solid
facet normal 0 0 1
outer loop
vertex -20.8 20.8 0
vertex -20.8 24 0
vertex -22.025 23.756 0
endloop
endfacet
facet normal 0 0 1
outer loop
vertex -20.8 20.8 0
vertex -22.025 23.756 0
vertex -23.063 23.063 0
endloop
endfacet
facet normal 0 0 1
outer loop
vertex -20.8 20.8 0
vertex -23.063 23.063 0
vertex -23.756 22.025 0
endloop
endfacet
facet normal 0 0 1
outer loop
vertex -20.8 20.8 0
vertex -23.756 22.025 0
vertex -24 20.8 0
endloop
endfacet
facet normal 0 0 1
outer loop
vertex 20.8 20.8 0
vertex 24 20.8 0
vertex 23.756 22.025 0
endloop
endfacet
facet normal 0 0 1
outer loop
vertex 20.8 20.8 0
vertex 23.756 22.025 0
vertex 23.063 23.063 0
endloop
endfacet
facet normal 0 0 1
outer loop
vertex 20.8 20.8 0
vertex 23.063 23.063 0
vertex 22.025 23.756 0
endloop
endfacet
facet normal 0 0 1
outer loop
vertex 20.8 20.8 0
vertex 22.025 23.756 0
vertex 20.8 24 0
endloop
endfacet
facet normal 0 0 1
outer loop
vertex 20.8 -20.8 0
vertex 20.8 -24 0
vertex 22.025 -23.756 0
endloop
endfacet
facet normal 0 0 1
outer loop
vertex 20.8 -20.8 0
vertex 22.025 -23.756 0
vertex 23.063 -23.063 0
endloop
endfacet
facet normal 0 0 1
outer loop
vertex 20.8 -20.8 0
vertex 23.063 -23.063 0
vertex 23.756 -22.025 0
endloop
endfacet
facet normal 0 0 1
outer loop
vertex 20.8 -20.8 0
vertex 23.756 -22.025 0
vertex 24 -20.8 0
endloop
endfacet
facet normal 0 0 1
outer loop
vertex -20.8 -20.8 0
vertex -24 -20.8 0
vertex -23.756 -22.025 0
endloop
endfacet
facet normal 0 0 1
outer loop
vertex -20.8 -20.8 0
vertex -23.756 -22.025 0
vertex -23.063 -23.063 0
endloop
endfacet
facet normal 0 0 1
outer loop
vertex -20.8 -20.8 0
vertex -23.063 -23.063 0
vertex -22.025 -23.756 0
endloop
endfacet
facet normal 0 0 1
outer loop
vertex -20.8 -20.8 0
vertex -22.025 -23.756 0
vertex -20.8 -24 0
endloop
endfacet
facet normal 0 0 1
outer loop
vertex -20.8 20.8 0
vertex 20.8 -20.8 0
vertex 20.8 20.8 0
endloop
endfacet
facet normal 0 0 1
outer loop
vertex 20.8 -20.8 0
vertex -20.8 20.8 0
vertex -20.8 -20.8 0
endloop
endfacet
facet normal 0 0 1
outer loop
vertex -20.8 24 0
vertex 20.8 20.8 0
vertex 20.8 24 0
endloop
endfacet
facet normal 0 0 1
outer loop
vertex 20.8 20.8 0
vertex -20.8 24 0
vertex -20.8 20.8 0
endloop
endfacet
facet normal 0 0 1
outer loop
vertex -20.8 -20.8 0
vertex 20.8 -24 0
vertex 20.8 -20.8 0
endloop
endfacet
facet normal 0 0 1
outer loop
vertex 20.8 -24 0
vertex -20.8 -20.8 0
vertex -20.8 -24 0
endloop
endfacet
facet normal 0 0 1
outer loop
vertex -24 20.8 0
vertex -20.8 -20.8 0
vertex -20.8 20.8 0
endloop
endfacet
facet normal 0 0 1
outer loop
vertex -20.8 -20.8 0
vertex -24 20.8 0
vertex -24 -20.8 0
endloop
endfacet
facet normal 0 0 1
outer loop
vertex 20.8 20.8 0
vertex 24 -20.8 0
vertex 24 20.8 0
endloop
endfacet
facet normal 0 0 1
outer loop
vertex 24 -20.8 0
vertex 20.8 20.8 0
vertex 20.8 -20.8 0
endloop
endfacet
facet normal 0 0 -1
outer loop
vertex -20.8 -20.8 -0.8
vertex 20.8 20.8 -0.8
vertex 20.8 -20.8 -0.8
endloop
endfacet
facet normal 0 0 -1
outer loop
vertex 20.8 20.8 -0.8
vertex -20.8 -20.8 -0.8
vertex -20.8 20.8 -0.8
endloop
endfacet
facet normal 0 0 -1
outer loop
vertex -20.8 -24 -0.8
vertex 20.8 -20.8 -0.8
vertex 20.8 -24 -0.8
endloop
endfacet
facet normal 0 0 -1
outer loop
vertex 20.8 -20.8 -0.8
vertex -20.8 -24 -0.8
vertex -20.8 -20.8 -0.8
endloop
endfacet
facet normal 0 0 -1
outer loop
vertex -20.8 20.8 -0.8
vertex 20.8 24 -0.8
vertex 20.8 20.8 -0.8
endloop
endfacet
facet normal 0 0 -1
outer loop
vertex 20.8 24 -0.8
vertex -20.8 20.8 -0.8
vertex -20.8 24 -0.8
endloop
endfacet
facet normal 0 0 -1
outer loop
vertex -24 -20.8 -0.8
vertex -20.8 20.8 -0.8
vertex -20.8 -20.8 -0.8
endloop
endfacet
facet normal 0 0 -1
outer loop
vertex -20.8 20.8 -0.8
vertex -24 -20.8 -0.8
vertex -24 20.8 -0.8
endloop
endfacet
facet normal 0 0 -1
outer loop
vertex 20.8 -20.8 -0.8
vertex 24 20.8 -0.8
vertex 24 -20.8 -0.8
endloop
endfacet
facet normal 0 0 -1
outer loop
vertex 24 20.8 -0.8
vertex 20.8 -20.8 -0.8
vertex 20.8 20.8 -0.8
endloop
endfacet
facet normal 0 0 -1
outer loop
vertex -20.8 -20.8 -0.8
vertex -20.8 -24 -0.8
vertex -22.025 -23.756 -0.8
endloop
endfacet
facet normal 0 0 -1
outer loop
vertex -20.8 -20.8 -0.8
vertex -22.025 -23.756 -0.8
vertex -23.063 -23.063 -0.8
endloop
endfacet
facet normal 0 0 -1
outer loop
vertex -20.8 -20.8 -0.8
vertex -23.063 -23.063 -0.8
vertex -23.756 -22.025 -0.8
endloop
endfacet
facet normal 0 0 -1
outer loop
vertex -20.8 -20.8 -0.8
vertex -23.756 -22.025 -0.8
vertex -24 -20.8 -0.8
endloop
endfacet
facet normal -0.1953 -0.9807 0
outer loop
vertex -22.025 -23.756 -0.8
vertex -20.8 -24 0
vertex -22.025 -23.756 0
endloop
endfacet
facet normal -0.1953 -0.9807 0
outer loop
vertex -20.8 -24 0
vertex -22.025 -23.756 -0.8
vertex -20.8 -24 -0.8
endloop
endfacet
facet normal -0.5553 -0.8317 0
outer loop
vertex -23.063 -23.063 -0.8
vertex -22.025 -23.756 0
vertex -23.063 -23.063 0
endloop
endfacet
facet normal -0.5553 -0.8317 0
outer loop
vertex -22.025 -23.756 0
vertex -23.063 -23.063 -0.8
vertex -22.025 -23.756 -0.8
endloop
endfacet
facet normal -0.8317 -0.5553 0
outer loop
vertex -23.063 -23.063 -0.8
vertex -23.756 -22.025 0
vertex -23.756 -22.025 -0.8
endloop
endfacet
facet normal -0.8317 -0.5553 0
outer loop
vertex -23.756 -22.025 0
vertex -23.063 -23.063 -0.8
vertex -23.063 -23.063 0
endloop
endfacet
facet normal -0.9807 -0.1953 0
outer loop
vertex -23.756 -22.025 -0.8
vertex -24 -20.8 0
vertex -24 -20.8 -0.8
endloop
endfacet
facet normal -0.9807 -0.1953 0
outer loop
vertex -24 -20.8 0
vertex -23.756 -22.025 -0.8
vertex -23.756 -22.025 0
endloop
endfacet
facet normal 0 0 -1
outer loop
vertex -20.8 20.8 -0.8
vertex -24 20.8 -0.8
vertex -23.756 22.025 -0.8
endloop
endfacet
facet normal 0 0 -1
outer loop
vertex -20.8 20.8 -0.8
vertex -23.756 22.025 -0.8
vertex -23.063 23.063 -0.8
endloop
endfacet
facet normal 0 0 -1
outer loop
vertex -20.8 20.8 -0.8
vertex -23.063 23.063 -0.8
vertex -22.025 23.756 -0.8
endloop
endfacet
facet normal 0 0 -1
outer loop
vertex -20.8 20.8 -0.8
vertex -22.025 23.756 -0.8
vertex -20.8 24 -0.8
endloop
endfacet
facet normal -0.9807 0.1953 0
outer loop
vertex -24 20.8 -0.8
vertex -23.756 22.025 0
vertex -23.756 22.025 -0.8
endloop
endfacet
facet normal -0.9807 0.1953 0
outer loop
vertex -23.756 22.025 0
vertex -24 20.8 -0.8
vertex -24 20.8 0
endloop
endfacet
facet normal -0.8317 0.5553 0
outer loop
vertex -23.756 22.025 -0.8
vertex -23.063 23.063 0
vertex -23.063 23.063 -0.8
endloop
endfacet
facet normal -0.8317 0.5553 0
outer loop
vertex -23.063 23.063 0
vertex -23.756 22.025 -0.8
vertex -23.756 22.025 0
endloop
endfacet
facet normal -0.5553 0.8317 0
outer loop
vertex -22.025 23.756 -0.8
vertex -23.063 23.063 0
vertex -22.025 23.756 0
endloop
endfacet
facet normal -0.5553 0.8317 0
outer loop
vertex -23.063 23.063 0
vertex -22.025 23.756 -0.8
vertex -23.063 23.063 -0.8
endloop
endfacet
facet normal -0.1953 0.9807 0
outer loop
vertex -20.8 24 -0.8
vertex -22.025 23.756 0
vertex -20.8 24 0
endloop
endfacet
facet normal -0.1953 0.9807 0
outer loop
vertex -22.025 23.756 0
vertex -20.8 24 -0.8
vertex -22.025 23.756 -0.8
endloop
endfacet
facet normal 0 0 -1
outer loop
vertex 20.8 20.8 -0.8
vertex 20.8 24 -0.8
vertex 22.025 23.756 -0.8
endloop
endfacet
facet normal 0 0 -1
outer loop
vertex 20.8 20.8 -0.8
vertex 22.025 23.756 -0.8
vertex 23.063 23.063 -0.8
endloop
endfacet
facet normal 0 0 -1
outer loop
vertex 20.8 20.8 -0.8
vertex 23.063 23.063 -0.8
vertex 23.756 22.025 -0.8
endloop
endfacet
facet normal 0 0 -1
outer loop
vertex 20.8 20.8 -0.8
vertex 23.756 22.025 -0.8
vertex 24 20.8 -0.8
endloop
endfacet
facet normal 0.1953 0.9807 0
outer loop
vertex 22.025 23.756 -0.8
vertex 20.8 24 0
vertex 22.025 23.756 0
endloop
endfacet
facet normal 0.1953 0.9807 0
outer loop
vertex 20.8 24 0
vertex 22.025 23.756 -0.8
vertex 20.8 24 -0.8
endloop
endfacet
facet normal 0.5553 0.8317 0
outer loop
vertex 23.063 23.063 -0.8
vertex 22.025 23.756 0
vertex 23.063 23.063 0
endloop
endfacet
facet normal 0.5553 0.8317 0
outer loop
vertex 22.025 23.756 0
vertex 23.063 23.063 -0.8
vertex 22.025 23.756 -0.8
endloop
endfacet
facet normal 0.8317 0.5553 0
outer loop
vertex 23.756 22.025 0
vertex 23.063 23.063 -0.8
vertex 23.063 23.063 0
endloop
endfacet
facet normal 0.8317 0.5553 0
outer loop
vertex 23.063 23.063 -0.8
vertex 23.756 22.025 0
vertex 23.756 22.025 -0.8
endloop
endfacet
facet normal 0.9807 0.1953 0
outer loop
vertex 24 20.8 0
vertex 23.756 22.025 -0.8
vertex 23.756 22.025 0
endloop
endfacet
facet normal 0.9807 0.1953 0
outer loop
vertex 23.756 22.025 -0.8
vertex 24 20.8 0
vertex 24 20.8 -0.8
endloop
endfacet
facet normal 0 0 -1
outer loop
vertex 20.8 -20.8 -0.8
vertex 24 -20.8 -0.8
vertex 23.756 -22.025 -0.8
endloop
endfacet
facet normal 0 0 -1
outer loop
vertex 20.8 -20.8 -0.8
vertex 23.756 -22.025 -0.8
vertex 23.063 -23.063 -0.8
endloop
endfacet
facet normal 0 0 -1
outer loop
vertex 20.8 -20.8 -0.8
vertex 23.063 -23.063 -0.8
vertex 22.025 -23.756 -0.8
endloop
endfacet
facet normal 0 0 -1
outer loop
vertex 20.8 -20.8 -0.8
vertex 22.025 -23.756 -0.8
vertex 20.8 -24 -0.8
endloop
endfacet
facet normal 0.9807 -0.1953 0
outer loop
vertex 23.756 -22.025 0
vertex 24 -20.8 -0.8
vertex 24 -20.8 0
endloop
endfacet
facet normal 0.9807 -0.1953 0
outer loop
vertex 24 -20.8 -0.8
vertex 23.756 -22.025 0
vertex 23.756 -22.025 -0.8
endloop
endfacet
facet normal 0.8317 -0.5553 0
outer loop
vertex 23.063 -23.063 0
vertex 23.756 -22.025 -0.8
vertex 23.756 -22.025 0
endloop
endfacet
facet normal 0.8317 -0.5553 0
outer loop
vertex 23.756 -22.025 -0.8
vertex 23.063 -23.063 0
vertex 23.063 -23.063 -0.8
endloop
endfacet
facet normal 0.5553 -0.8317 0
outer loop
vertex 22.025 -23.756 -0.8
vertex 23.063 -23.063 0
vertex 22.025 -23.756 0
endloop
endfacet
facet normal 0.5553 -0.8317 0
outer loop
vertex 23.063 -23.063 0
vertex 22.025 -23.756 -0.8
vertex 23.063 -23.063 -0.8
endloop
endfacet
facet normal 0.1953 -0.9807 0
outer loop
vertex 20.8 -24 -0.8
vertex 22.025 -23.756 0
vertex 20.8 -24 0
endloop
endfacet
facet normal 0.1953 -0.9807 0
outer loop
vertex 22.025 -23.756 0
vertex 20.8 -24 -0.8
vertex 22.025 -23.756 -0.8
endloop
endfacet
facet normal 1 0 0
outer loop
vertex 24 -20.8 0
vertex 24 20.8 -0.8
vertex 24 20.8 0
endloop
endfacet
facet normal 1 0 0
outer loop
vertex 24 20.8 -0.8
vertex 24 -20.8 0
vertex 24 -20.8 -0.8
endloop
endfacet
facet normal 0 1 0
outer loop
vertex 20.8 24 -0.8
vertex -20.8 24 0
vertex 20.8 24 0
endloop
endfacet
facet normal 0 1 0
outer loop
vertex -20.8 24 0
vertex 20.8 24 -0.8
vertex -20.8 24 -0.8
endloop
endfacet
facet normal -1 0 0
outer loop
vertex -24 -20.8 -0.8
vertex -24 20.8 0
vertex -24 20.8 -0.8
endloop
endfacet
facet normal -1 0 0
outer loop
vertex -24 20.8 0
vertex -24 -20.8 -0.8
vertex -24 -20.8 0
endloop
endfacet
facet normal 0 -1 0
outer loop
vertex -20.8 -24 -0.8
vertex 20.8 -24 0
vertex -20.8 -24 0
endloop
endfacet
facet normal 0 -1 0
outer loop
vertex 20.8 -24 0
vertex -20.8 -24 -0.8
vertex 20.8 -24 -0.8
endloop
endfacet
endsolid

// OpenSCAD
// file: ../p/4-4edge.scad
use <../lib.scad>
$fa=1; $fs=0.2;
function ldraw_lib__4_4edge(realsolid=false) = [
// 0 Circle 1.0
// 0 Name: 4-4edge.dat
// 0 Author: James Jessiman
// 0 !LDRAW_ORG Primitive UPDATE 2017-01
// 0 !LICENSE Licensed under CC BY 2.0 and CC BY 4.0 : see CAreadme.txt
// 
// 0 BFC CERTIFY CCW
  [0,"BFC","CERTIFY"],
  [0,"BFC","CCW"],
// 
// 0 !HISTORY 1998-12-15 [PTadmin] Official Update 1998-10
// 0 !HISTORY 2005-12-28 [PTadmin] Official Update 2005-01
// 0 !HISTORY 2007-06-24 [PTadmin] Header formatted for Contributor Agreement
// 0 !HISTORY 2008-07-01 [PTadmin] Official Update 2008-01
// 0 !HISTORY 2017-01-15 [Steffen] BFCed
// 0 !HISTORY 2017-12-30 [PTadmin] Official Update 2017-01
// 
// 
// 2 24 1 0 0 0.9239 0 0.3827
  [2,24,1,0,0,0.9239,0,0.3827],
// 2 24 0.9239 0 0.3827 0.7071 0 0.7071
  [2,24,0.9239,0,0.3827,0.7071,0,0.7071],
// 2 24 0.7071 0 0.7071 0.3827 0 0.9239
  [2,24,0.7071,0,0.7071,0.3827,0,0.9239],
// 2 24 0.3827 0 0.9239 0 0 1
  [2,24,0.3827,0,0.9239,0,0,1],
// 2 24 0 0 1 -0.3827 0 0.9239
  [2,24,0,0,1,-0.3827,0,0.9239],
// 2 24 -0.3827 0 0.9239 -0.7071 0 0.7071
  [2,24,-0.3827,0,0.9239,-0.7071,0,0.7071],
// 2 24 -0.7071 0 0.7071 -0.9239 0 0.3827
  [2,24,-0.7071,0,0.7071,-0.9239,0,0.3827],
// 2 24 -0.9239 0 0.3827 -1 0 -0
  [2,24,-0.9239,0,0.3827,-1,0,-0],
// 2 24 -1 0 -0 -0.9239 0 -0.3827
  [2,24,-1,0,-0,-0.9239,0,-0.3827],
// 2 24 -0.9239 0 -0.3827 -0.7071 0 -0.7071
  [2,24,-0.9239,0,-0.3827,-0.7071,0,-0.7071],
// 2 24 -0.7071 0 -0.7071 -0.3827 0 -0.9239
  [2,24,-0.7071,0,-0.7071,-0.3827,0,-0.9239],
// 2 24 -0.3827 0 -0.9239 0 0 -1
  [2,24,-0.3827,0,-0.9239,0,0,-1],
// 2 24 0 0 -1 0.3827 0 -0.9239
  [2,24,0,0,-1,0.3827,0,-0.9239],
// 2 24 0.3827 0 -0.9239 0.7071 0 -0.7071
  [2,24,0.3827,0,-0.9239,0.7071,0,-0.7071],
// 2 24 0.7071 0 -0.7071 0.9239 0 -0.3827
  [2,24,0.7071,0,-0.7071,0.9239,0,-0.3827],
// 2 24 0.9239 0 -0.3827 1 0 0
  [2,24,0.9239,0,-0.3827,1,0,0],
];
module ldraw_lib__4_4edge(step=0, col=false, unit=2/5, alt=false, line=0.2, solid=!$preview)
    makepoly(ldraw_lib__4_4edge(solid), step=step, col=col, unit=unit, alt=alt, line=line, solid=solid);
ldraw_lib__4_4edge(line=0.2);
// file: ../p/4-4disc.scad
use <../lib.scad>
$fa=1; $fs=0.2;
function ldraw_lib__4_4disc(realsolid=false) = [
// 0 Disc 1.0
// 0 Name: 4-4disc.dat
// 0 Author: James Jessiman
// 0 !LDRAW_ORG Primitive UPDATE 2002-02
// 0 !LICENSE Licensed under CC BY 2.0 and CC BY 4.0 : see CAreadme.txt
// 
// 0 BFC CERTIFY CCW
  [0,"BFC","CERTIFY"],
  [0,"BFC","CCW"],
// 
// 0 !HISTORY 1998-12-15 [PTadmin] Official Update 1998-10
// 0 !HISTORY 2002-03-23 [sbliss] Added BFC statement
// 0 !HISTORY 2002-04-25 [PTadmin] Official Update 2002-02
// 0 !HISTORY 2007-06-24 [PTadmin] Header formatted for Contributor Agreement
// 0 !HISTORY 2008-07-01 [PTadmin] Official Update 2008-01
// 
// 
// 3 16 0 0 0 1 0 0 0.9239 0 0.3827
  [3,16,0,0,0,1,0,0,0.9239,0,0.3827],
// 3 16 0 0 0 0.9239 0 0.3827 0.7071 0 0.7071
  [3,16,0,0,0,0.9239,0,0.3827,0.7071,0,0.7071],
// 3 16 0 0 0 0.7071 0 0.7071 0.3827 0 0.9239
  [3,16,0,0,0,0.7071,0,0.7071,0.3827,0,0.9239],
// 3 16 0 0 0 0.3827 0 0.9239 0 0 1
  [3,16,0,0,0,0.3827,0,0.9239,0,0,1],
// 3 16 0 0 0 0 0 1 -0.3827 0 0.9239
  [3,16,0,0,0,0,0,1,-0.3827,0,0.9239],
// 3 16 0 0 0 -0.3827 0 0.9239 -0.7071 0 0.7071
  [3,16,0,0,0,-0.3827,0,0.9239,-0.7071,0,0.7071],
// 3 16 0 0 0 -0.7071 0 0.7071 -0.9239 0 0.3827
  [3,16,0,0,0,-0.7071,0,0.7071,-0.9239,0,0.3827],
// 3 16 0 0 0 -0.9239 0 0.3827 -1 0 -0
  [3,16,0,0,0,-0.9239,0,0.3827,-1,0,-0],
// 3 16 0 0 0 -1 0 -0 -0.9239 0 -0.3827
  [3,16,0,0,0,-1,0,-0,-0.9239,0,-0.3827],
// 3 16 0 0 0 -0.9239 0 -0.3827 -0.7071 0 -0.7071
  [3,16,0,0,0,-0.9239,0,-0.3827,-0.7071,0,-0.7071],
// 3 16 0 0 0 -0.7071 0 -0.7071 -0.3827 0 -0.9239
  [3,16,0,0,0,-0.7071,0,-0.7071,-0.3827,0,-0.9239],
// 3 16 0 0 0 -0.3827 0 -0.9239 0 0 -1
  [3,16,0,0,0,-0.3827,0,-0.9239,0,0,-1],
// 3 16 0 0 0 0 0 -1 0.3827 0 -0.9239
  [3,16,0,0,0,0,0,-1,0.3827,0,-0.9239],
// 3 16 0 0 0 0.3827 0 -0.9239 0.7071 0 -0.7071
  [3,16,0,0,0,0.3827,0,-0.9239,0.7071,0,-0.7071],
// 3 16 0 0 0 0.7071 0 -0.7071 0.9239 0 -0.3827
  [3,16,0,0,0,0.7071,0,-0.7071,0.9239,0,-0.3827],
// 3 16 0 0 0 0.9239 0 -0.3827 1 0 0
  [3,16,0,0,0,0.9239,0,-0.3827,1,0,0],
// 0
];
module ldraw_lib__4_4disc(step=0, col=false, unit=2/5, alt=false, line=0.2, solid=!$preview)
    makepoly(ldraw_lib__4_4disc(solid), step=step, col=col, unit=unit, alt=alt, line=line, solid=solid);
ldraw_lib__4_4disc(line=0.2);
// file: ../p/4-4cyli.scad
use <../lib.scad>
$fa=1; $fs=0.2;
function ldraw_lib__4_4cyli(realsolid=false) = [
// 0 Cylinder 1.0
// 0 Name: 4-4cyli.dat
// 0 Author: James Jessiman
// 0 !LDRAW_ORG Primitive UPDATE 2005-01
// 0 !LICENSE Licensed under CC BY 2.0 and CC BY 4.0 : see CAreadme.txt
// 
// 0 BFC CERTIFY CCW
  [0,"BFC","CERTIFY"],
  [0,"BFC","CCW"],
// 
// 0 !HISTORY 1998-12-15 [PTadmin] Official Update 1998-10
// 0 !HISTORY 2002-03-23 [sbliss] Added BFC statement; merged headers from files in distributions LDraw 0.27 and Complete.
// 0 !HISTORY 2002-04-25 [PTadmin] Official Update 2002-02
// 0 !HISTORY 2004-12-14 [guyvivan] BFC CCW
// 0 !HISTORY 2005-12-28 [PTadmin] Official Update 2005-01
// 0 !HISTORY 2007-06-24 [PTadmin] Header formatted for Contributor Agreement
// 0 !HISTORY 2008-07-01 [PTadmin] Official Update 2008-01
// 
// 
// 4 16 1 1 0 0.9239 1 0.3827 0.9239 0 0.3827 1 0 0
  [4,16,1,1,0,0.9239,1,0.3827,0.9239,0,0.3827,1,0,0],
// 5 24 1 0 0 1 1 0 0.9239 0 0.3827 0.9239 0 -0.3827
  [5,24,1,0,0,1,1,0,0.9239,0,0.3827,0.9239,0,-0.3827],
// 4 16 0.9239 1 0.3827 0.7071 1 0.7071 0.7071 0 0.7071 0.9239 0 0.3827
  [4,16,0.9239,1,0.3827,0.7071,1,0.7071,0.7071,0,0.7071,0.9239,0,0.3827],
// 5 24 0.9239 0 0.3827 0.9239 1 0.3827 0.7071 0 0.7071 1 0 0
  [5,24,0.9239,0,0.3827,0.9239,1,0.3827,0.7071,0,0.7071,1,0,0],
// 4 16 0.7071 1 0.7071 0.3827 1 0.9239 0.3827 0 0.9239 0.7071 0 0.7071
  [4,16,0.7071,1,0.7071,0.3827,1,0.9239,0.3827,0,0.9239,0.7071,0,0.7071],
// 5 24 0.7071 0 0.7071 0.7071 1 0.7071 0.3827 0 0.9239 0.9239 0 0.3827
  [5,24,0.7071,0,0.7071,0.7071,1,0.7071,0.3827,0,0.9239,0.9239,0,0.3827],
// 4 16 0.3827 1 0.9239 0 1 1 0 0 1 0.3827 0 0.9239
  [4,16,0.3827,1,0.9239,0,1,1,0,0,1,0.3827,0,0.9239],
// 5 24 0.3827 0 0.9239 0.3827 1 0.9239 0 0 1 0.7071 0 0.7071
  [5,24,0.3827,0,0.9239,0.3827,1,0.9239,0,0,1,0.7071,0,0.7071],
// 4 16 0 1 1 -0.3827 1 0.9239 -0.3827 0 0.9239 0 0 1
  [4,16,0,1,1,-0.3827,1,0.9239,-0.3827,0,0.9239,0,0,1],
// 5 24 0 0 1 0 1 1 -0.3827 0 0.9239 0.3827 0 0.9239
  [5,24,0,0,1,0,1,1,-0.3827,0,0.9239,0.3827,0,0.9239],
// 4 16 -0.3827 1 0.9239 -0.7071 1 0.7071 -0.7071 0 0.7071 -0.3827 0 0.9239
  [4,16,-0.3827,1,0.9239,-0.7071,1,0.7071,-0.7071,0,0.7071,-0.3827,0,0.9239],
// 5 24 -0.3827 0 0.9239 -0.3827 1 0.9239 -0.7071 0 0.7071 0 0 1
  [5,24,-0.3827,0,0.9239,-0.3827,1,0.9239,-0.7071,0,0.7071,0,0,1],
// 4 16 -0.7071 1 0.7071 -0.9239 1 0.3827 -0.9239 0 0.3827 -0.7071 0 0.7071
  [4,16,-0.7071,1,0.7071,-0.9239,1,0.3827,-0.9239,0,0.3827,-0.7071,0,0.7071],
// 5 24 -0.7071 0 0.7071 -0.7071 1 0.7071 -0.9239 0 0.3827 -0.3827 0 0.9239
  [5,24,-0.7071,0,0.7071,-0.7071,1,0.7071,-0.9239,0,0.3827,-0.3827,0,0.9239],
// 4 16 -0.9239 1 0.3827 -1 1 0 -1 0 0 -0.9239 0 0.3827
  [4,16,-0.9239,1,0.3827,-1,1,0,-1,0,0,-0.9239,0,0.3827],
// 5 24 -0.9239 0 0.3827 -0.9239 1 0.3827 -1 0 0 -0.7071 0 0.7071
  [5,24,-0.9239,0,0.3827,-0.9239,1,0.3827,-1,0,0,-0.7071,0,0.7071],
// 4 16 -1 1 0 -0.9239 1 -0.3827 -0.9239 0 -0.3827 -1 0 0
  [4,16,-1,1,0,-0.9239,1,-0.3827,-0.9239,0,-0.3827,-1,0,0],
// 5 24 -1 0 0 -1 1 0 -0.9239 0 -0.3827 -0.9239 0 0.3827
  [5,24,-1,0,0,-1,1,0,-0.9239,0,-0.3827,-0.9239,0,0.3827],
// 4 16 -0.9239 1 -0.3827 -0.7071 1 -0.7071 -0.7071 0 -0.7071 -0.9239 0 -0.3827
  [4,16,-0.9239,1,-0.3827,-0.7071,1,-0.7071,-0.7071,0,-0.7071,-0.9239,0,-0.3827],
// 5 24 -0.9239 0 -0.3827 -0.9239 1 -0.3827 -0.7071 0 -0.7071 -1 0 0
  [5,24,-0.9239,0,-0.3827,-0.9239,1,-0.3827,-0.7071,0,-0.7071,-1,0,0],
// 4 16 -0.7071 1 -0.7071 -0.3827 1 -0.9239 -0.3827 0 -0.9239 -0.7071 0 -0.7071
  [4,16,-0.7071,1,-0.7071,-0.3827,1,-0.9239,-0.3827,0,-0.9239,-0.7071,0,-0.7071],
// 5 24 -0.7071 0 -0.7071 -0.7071 1 -0.7071 -0.3827 0 -0.9239 -0.9239 0 -0.3827
  [5,24,-0.7071,0,-0.7071,-0.7071,1,-0.7071,-0.3827,0,-0.9239,-0.9239,0,-0.3827],
// 4 16 -0.3827 1 -0.9239 0 1 -1 0 0 -1 -0.3827 0 -0.9239
  [4,16,-0.3827,1,-0.9239,0,1,-1,0,0,-1,-0.3827,0,-0.9239],
// 5 24 -0.3827 0 -0.9239 -0.3827 1 -0.9239 0 0 -1 -0.7071 0 -0.7071
  [5,24,-0.3827,0,-0.9239,-0.3827,1,-0.9239,0,0,-1,-0.7071,0,-0.7071],
// 4 16 0 1 -1 0.3827 1 -0.9239 0.3827 0 -0.9239 0 0 -1
  [4,16,0,1,-1,0.3827,1,-0.9239,0.3827,0,-0.9239,0,0,-1],
// 5 24 0 0 -1 0 1 -1 0.3827 0 -0.9239 -0.3827 0 -0.9239
  [5,24,0,0,-1,0,1,-1,0.3827,0,-0.9239,-0.3827,0,-0.9239],
// 4 16 0.3827 1 -0.9239 0.7071 1 -0.7071 0.7071 0 -0.7071 0.3827 0 -0.9239
  [4,16,0.3827,1,-0.9239,0.7071,1,-0.7071,0.7071,0,-0.7071,0.3827,0,-0.9239],
// 5 24 0.3827 0 -0.9239 0.3827 1 -0.9239 0.7071 0 -0.7071 0 0 -1
  [5,24,0.3827,0,-0.9239,0.3827,1,-0.9239,0.7071,0,-0.7071,0,0,-1],
// 4 16 0.7071 1 -0.7071 0.9239 1 -0.3827 0.9239 0 -0.3827 0.7071 0 -0.7071
  [4,16,0.7071,1,-0.7071,0.9239,1,-0.3827,0.9239,0,-0.3827,0.7071,0,-0.7071],
// 5 24 0.7071 0 -0.7071 0.7071 1 -0.7071 0.9239 0 -0.3827 0.3827 0 -0.9239
  [5,24,0.7071,0,-0.7071,0.7071,1,-0.7071,0.9239,0,-0.3827,0.3827,0,-0.9239],
// 4 16 0.9239 1 -0.3827 1 1 0 1 0 0 0.9239 0 -0.3827
  [4,16,0.9239,1,-0.3827,1,1,0,1,0,0,0.9239,0,-0.3827],
// 5 24 0.9239 0 -0.3827 0.9239 1 -0.3827 1 0 0 0.7071 0 -0.7071
  [5,24,0.9239,0,-0.3827,0.9239,1,-0.3827,1,0,0,0.7071,0,-0.7071],
// 0
];
module ldraw_lib__4_4cyli(step=0, col=false, unit=2/5, alt=false, line=0.2, solid=!$preview)
    makepoly(ldraw_lib__4_4cyli(solid), step=step, col=col, unit=unit, alt=alt, line=line, solid=solid);
ldraw_lib__4_4cyli(line=0.2);
// file: ../p/stud3.scad
use <../lib.scad>
use <4-4cyli.scad>
use <4-4disc.scad>
use <4-4edge.scad>
$fa=1; $fs=0.2;
function ldraw_lib__stud3(realsolid=false) = realsolid ? 
    [openscad(translate([0,0,-eps()], o=cylinder(4+eps(), r=4)),2)] : [
// 0 Stud Tube Solid
// 0 Name: stud3.dat
// 0 Author: James Jessiman
// 0 !LDRAW_ORG Primitive UPDATE 2012-01
// 0 !LICENSE Licensed under CC BY 2.0 and CC BY 4.0 : see CAreadme.txt
// 
// 0 BFC CERTIFY CCW
  [0,"BFC","CERTIFY"],
  [0,"BFC","CCW"],
// 
// 0 !HISTORY 2002-04-04 [sbliss] Modified for BFC compliance
// 0 !HISTORY 2002-04-25 [PTadmin] Official Update 2002-02
// 0 !HISTORY 2007-06-24 [PTadmin] Header formatted for Contributor Agreement
// 0 !HISTORY 2008-07-01 [PTadmin] Official Update 2008-01
// 0 !HISTORY 2012-02-16 [Philo] Changed to CCW
// 0 !HISTORY 2012-03-30 [PTadmin] Official Update 2012-01
// 
// 
// 1 16 0 -4 0 4 0 0 0 1 0 0 0 4 4-4edge.dat
  [1,16,0,-4,0,4,0,0,0,1,0,0,0,4, ldraw_lib__4_4edge(realsolid)],
// 1 16 0 0 0 4 0 0 0 1 0 0 0 4 4-4edge.dat
  [1,16,0,0,0,4,0,0,0,1,0,0,0,4, ldraw_lib__4_4edge(realsolid)],
// 1 16 0 -4 0 4 0 0 0 1 0 0 0 4 4-4disc.dat
  [1,16,0,-4,0,4,0,0,0,1,0,0,0,4, ldraw_lib__4_4disc(realsolid)],
// 1 16 0 -4 0 4 0 0 0 4 0 0 0 4 4-4cyli.dat
  [1,16,0,-4,0,4,0,0,0,4,0,0,0,4, ldraw_lib__4_4cyli(realsolid)],
];
module ldraw_lib__stud3(step=0, col=false, unit=2/5, alt=false, line=0.2, solid=!$preview)
    makepoly(ldraw_lib__stud3(solid), step=step, col=col, unit=unit, alt=alt, line=line, solid=solid);
ldraw_lib__stud3(line=0.2);
// file: ../p/stud.scad
use <../lib.scad>
use <4-4cyli.scad>
use <4-4disc.scad>
use <4-4edge.scad>
$fa=1; $fs=0.2;
function ldraw_lib__stud(realsolid=false) = realsolid ? 
    [openscad(translate([0,0,-eps()], o=cylinder(4+eps(), r=6)),2)] : [
// 0 Stud
// 0 Name: stud.dat
// 0 Author: James Jessiman
// 0 !LDRAW_ORG Primitive UPDATE 2012-01
// 0 !LICENSE Licensed under CC BY 2.0 and CC BY 4.0 : see CAreadme.txt
// 
// 0 BFC CERTIFY CCW
  [0,"BFC","CERTIFY"],
  [0,"BFC","CCW"],
// 
// 0 !HISTORY 2002-04-04 [sbliss] Modified for BFC compliance
// 0 !HISTORY 2002-04-25 [PTadmin] Official Update 2002-02
// 0 !HISTORY 2007-06-24 [PTadmin] Header formatted for Contributor Agreement
// 0 !HISTORY 2008-07-01 [PTadmin] Official Update 2008-01
// 0 !HISTORY 2012-02-16 [Philo] Changed to CCW
// 0 !HISTORY 2012-03-30 [PTadmin] Official Update 2012-01
// 
// 
// 1 16 0 0 0 6 0 0 0 1 0 0 0 6 4-4edge.dat
  [1,16,0,0,0,6,0,0,0,1,0,0,0,6, ldraw_lib__4_4edge(realsolid)],
// 1 16 0 -4 0 6 0 0 0 1 0 0 0 6 4-4edge.dat
  [1,16,0,-4,0,6,0,0,0,1,0,0,0,6, ldraw_lib__4_4edge(realsolid)],
// 1 16 0 0 0 6 0 0 0 -4 0 0 0 6 4-4cyli.dat
  [1,16,0,0,0,6,0,0,0,-4,0,0,0,6, ldraw_lib__4_4cyli(realsolid)],
// 1 16 0 -4 0 6 0 0 0 1 0 0 0 6 4-4disc.dat
  [1,16,0,-4,0,6,0,0,0,1,0,0,0,6, ldraw_lib__4_4disc(realsolid)],
];
module ldraw_lib__stud(step=0, col=false, unit=2/5, alt=false, line=0.2, solid=!$preview)
    makepoly(ldraw_lib__stud(solid), step=step, col=col, unit=unit, alt=alt, line=line, solid=solid);
ldraw_lib__stud(line=0.2);
// file: ../p/box5.scad
use <../lib.scad>
$fa=1; $fs=0.2;
function ldraw_lib__box5(realsolid=false) = [
// 0 Box with 5 Faces and All Edges
// 0 Name: box5.dat
// 0 Author: James Jessiman
// 0 !LDRAW_ORG Primitive UPDATE 2012-01
// 0 !LICENSE Licensed under CC BY 2.0 and CC BY 4.0 : see CAreadme.txt
// 
// 0 BFC CERTIFY CCW
  [0,"BFC","CERTIFY"],
  [0,"BFC","CCW"],
// 
// 0 !HISTORY 2002-04-03 [sbliss] Modified for BFC compliance
// 0 !HISTORY 2002-04-25 [PTadmin] Official Update 2002-02
// 0 !HISTORY 2007-06-24 [PTadmin] Header formatted for Contributor Agreement
// 0 !HISTORY 2008-07-01 [PTadmin] Official Update 2008-01
// 0 !HISTORY 2012-02-16 [Philo] Changed to CCW
// 0 !HISTORY 2012-03-30 [PTadmin] Official Update 2012-01
// 
// 
// 2 24 1 1 1 -1 1 1
  [2,24,1,1,1,-1,1,1],
// 2 24 -1 1 1 -1 1 -1
  [2,24,-1,1,1,-1,1,-1],
// 2 24 -1 1 -1 1 1 -1
  [2,24,-1,1,-1,1,1,-1],
// 2 24 1 1 -1 1 1 1
  [2,24,1,1,-1,1,1,1],
// 2 24 1 0 1 -1 0 1
  [2,24,1,0,1,-1,0,1],
// 2 24 -1 0 1 -1 0 -1
  [2,24,-1,0,1,-1,0,-1],
// 2 24 -1 0 -1 1 0 -1
  [2,24,-1,0,-1,1,0,-1],
// 2 24 1 0 -1 1 0 1
  [2,24,1,0,-1,1,0,1],
// 2 24 1 0 1 1 1 1
  [2,24,1,0,1,1,1,1],
// 2 24 -1 0 1 -1 1 1
  [2,24,-1,0,1,-1,1,1],
// 2 24 1 0 -1 1 1 -1
  [2,24,1,0,-1,1,1,-1],
// 2 24 -1 0 -1 -1 1 -1
  [2,24,-1,0,-1,-1,1,-1],
// 4 16 -1 1 1 1 1 1 1 1 -1 -1 1 -1
  [4,16,-1,1,1,1,1,1,1,1,-1,-1,1,-1],
// 4 16 -1 1 1 -1 0 1 1 0 1 1 1 1
  [4,16,-1,1,1,-1,0,1,1,0,1,1,1,1],
// 4 16 -1 1 -1 -1 0 -1 -1 0 1 -1 1 1
  [4,16,-1,1,-1,-1,0,-1,-1,0,1,-1,1,1],
// 4 16 1 1 -1 1 0 -1 -1 0 -1 -1 1 -1
  [4,16,1,1,-1,1,0,-1,-1,0,-1,-1,1,-1],
// 4 16 1 1 1 1 0 1 1 0 -1 1 1 -1
  [4,16,1,1,1,1,0,1,1,0,-1,1,1,-1],
];
module ldraw_lib__box5(step=0, col=false, unit=2/5, alt=false, line=0.2, solid=!$preview)
    makepoly(ldraw_lib__box5(solid), step=step, col=col, unit=unit, alt=alt, line=line, solid=solid);
ldraw_lib__box5(line=0.2);
// file: ../p/box4t.scad
use <../lib.scad>
$fa=1; $fs=0.2;
function ldraw_lib__box4t(realsolid=false) = [
// 0 Box with 4 Adjacent Faces and All Edges
// 0 Name: box4t.dat
// 0 Author: Tore Eriksson [Tore_Eriksson]
// 0 !LDRAW_ORG Primitive UPDATE 2003-02
// 0 !LICENSE Licensed under CC BY 2.0 and CC BY 4.0 : see CAreadme.txt
// 
// 0 BFC CERTIFY CCW
  [0,"BFC","CERTIFY"],
  [0,"BFC","CCW"],
// 
// 0 !HISTORY 1997-09-29 [PTadmin] Official Update 1997-15
// 0 !HISTORY 2002-08-31 [izanette] Modified with WINDZ for BFC compliance
// 0 !HISTORY 2003-08-01 [PTadmin] Official Update 2003-02
// 0 !HISTORY 2007-06-24 [PTadmin] Header formatted for Contributor Agreement
// 0 !HISTORY 2008-07-01 [PTadmin] Official Update 2008-01
// 
// 
// 2 24 1 1 1 -1 1 1
  [2,24,1,1,1,-1,1,1],
// 2 24 -1 1 1 -1 1 -1
  [2,24,-1,1,1,-1,1,-1],
// 2 24 -1 1 -1 1 1 -1
  [2,24,-1,1,-1,1,1,-1],
// 2 24 1 1 -1 1 1 1
  [2,24,1,1,-1,1,1,1],
// 2 24 1 0 1 -1 0 1
  [2,24,1,0,1,-1,0,1],
// 2 24 -1 0 1 -1 0 -1
  [2,24,-1,0,1,-1,0,-1],
// 2 24 -1 0 -1 1 0 -1
  [2,24,-1,0,-1,1,0,-1],
// 2 24 1 0 -1 1 0 1
  [2,24,1,0,-1,1,0,1],
// 2 24 1 0 1 1 1 1
  [2,24,1,0,1,1,1,1],
// 2 24 -1 0 1 -1 1 1
  [2,24,-1,0,1,-1,1,1],
// 2 24 1 0 -1 1 1 -1
  [2,24,1,0,-1,1,1,-1],
// 2 24 -1 0 -1 -1 1 -1
  [2,24,-1,0,-1,-1,1,-1],
// 4 16 1 1 1 1 1 -1 -1 1 -1 -1 1 1
  [4,16,1,1,1,1,1,-1,-1,1,-1,-1,1,1],
// 4 16 1 1 1 -1 1 1 -1 0 1 1 0 1
  [4,16,1,1,1,-1,1,1,-1,0,1,1,0,1],
// 4 16 -1 1 1 -1 1 -1 -1 0 -1 -1 0 1
  [4,16,-1,1,1,-1,1,-1,-1,0,-1,-1,0,1],
// 0 4 16 -1 1 -1 -1 0 -1 1 0 -1 1 1 -1
// 4 16 1 1 -1 1 1 1 1 0 1 1 0 -1
  [4,16,1,1,-1,1,1,1,1,0,1,1,0,-1],
// 0
];
module ldraw_lib__box4t(step=0, col=false, unit=2/5, alt=false, line=0.2, solid=!$preview)
    makepoly(ldraw_lib__box4t(solid), step=step, col=col, unit=unit, alt=alt, line=line, solid=solid);
ldraw_lib__box4t(line=0.2);
// file: ../p/1-4edge.scad
use <../lib.scad>
$fa=1; $fs=0.2;
function ldraw_lib__1_4edge(realsolid=false) = [
// 0 Circle 0.25
// 0 Name: 1-4edge.dat
// 0 Author: James Jessiman
// 0 !LDRAW_ORG Primitive UPDATE 2017-01
// 0 !LICENSE Licensed under CC BY 2.0 and CC BY 4.0 : see CAreadme.txt
// 
// 0 BFC CERTIFY CCW
  [0,"BFC","CERTIFY"],
  [0,"BFC","CCW"],
// 
// 0 !HISTORY 2007-06-22 [PTadmin] Header formatted for Contributor Agreement
// 0 !HISTORY 2008-07-01 [PTadmin] Official Update 2008-01
// 0 !HISTORY 2017-01-15 [Steffen] BFCed
// 0 !HISTORY 2017-12-30 [PTadmin] Official Update 2017-01
// 
// 
// 2 24 1 0 0 0.9239 0 0.3827
  [2,24,1,0,0,0.9239,0,0.3827],
// 2 24 0.9239 0 0.3827 0.7071 0 0.7071
  [2,24,0.9239,0,0.3827,0.7071,0,0.7071],
// 2 24 0.7071 0 0.7071 0.3827 0 0.9239
  [2,24,0.7071,0,0.7071,0.3827,0,0.9239],
// 2 24 0.3827 0 0.9239 0 0 1
  [2,24,0.3827,0,0.9239,0,0,1],
];
module ldraw_lib__1_4edge(step=0, col=false, unit=2/5, alt=false, line=0.2, solid=!$preview)
    makepoly(ldraw_lib__1_4edge(solid), step=step, col=col, unit=unit, alt=alt, line=line, solid=solid);
ldraw_lib__1_4edge(line=0.2);
// file: ../p/1-4cyli.scad
use <../lib.scad>
$fa=1; $fs=0.2;
function ldraw_lib__1_4cyli(realsolid=false) = [
// 0 Cylinder 0.25
// 0 Name: 1-4cyli.dat
// 0 Author: James Jessiman
// 0 !LDRAW_ORG Primitive UPDATE 2012-01
// 0 !LICENSE Licensed under CC BY 2.0 and CC BY 4.0 : see CAreadme.txt
// 
// 0 BFC CERTIFY CCW
  [0,"BFC","CERTIFY"],
  [0,"BFC","CCW"],
// 
// 0 !HISTORY 2002-03-23 [sbliss] Added BFC statement.
// 0 !HISTORY 2002-04-25 [PTadmin] Official Update 2002-02
// 0 !HISTORY 2007-06-22 [PTadmin] Header formatted for Contributor Agreement
// 0 !HISTORY 2008-07-01 [PTadmin] Official Update 2008-01
// 0 !HISTORY 2012-02-16 [Philo] Changed to CCW
// 0 !HISTORY 2012-03-30 [PTadmin] Official Update 2012-01
// 
// 
// 4 16 1 1 0 0.9239 1 0.3827 0.9239 0 0.3827 1 0 0
  [4,16,1,1,0,0.9239,1,0.3827,0.9239,0,0.3827,1,0,0],
// 5 24 1 0 0 1 1 0 0.9239 0 0.3827 1 0 -1
  [5,24,1,0,0,1,1,0,0.9239,0,0.3827,1,0,-1],
// 4 16 0.9239 1 0.3827 0.7071 1 0.7071 0.7071 0 0.7071 0.9239 0 0.3827
  [4,16,0.9239,1,0.3827,0.7071,1,0.7071,0.7071,0,0.7071,0.9239,0,0.3827],
// 5 24 0.9239 0 0.3827 0.9239 1 0.3827 0.7071 0 0.7071 1 0 0
  [5,24,0.9239,0,0.3827,0.9239,1,0.3827,0.7071,0,0.7071,1,0,0],
// 4 16 0.7071 1 0.7071 0.3827 1 0.9239 0.3827 0 0.9239 0.7071 0 0.7071
  [4,16,0.7071,1,0.7071,0.3827,1,0.9239,0.3827,0,0.9239,0.7071,0,0.7071],
// 5 24 0.7071 0 0.7071 0.7071 1 0.7071 0.3827 0 0.9239 0.9239 0 0.3827
  [5,24,0.7071,0,0.7071,0.7071,1,0.7071,0.3827,0,0.9239,0.9239,0,0.3827],
// 4 16 0.3827 1 0.9239 0 1 1 0 0 1 0.3827 0 0.9239
  [4,16,0.3827,1,0.9239,0,1,1,0,0,1,0.3827,0,0.9239],
// 5 24 0.3827 0 0.9239 0.3827 1 0.9239 0 0 1 0.7071 0 0.7071
  [5,24,0.3827,0,0.9239,0.3827,1,0.9239,0,0,1,0.7071,0,0.7071],
// 5 24 0 0 1 0 1 1 0.3827 0 0.9239 -1 0 1
  [5,24,0,0,1,0,1,1,0.3827,0,0.9239,-1,0,1],
];
module ldraw_lib__1_4cyli(step=0, col=false, unit=2/5, alt=false, line=0.2, solid=!$preview)
    makepoly(ldraw_lib__1_4cyli(solid), step=step, col=col, unit=unit, alt=alt, line=line, solid=solid);
ldraw_lib__1_4cyli(line=0.2);
// file: s/3004s01.scad
use <../../lib.scad>
use <../../p/box4t.scad>
use <../../p/box5.scad>
use <../../p/stud.scad>
use <../../p/stud3.scad>
$fa=1; $fs=0.2;
function ldraw_lib__s__3004s01(realsolid=false) = [
// 0 ~Brick  1 x  2 without Front Face
// 0 Name: s\3004s01.dat
// 0 Author: James Jessiman
// 0 !LDRAW_ORG Subpart UPDATE 2003-03
// 0 !LICENSE Licensed under CC BY 2.0 and CC BY 4.0 : see CAreadme.txt
// 
// 0 BFC CERTIFY CCW
  [0,"BFC","CERTIFY"],
  [0,"BFC","CCW"],
// 
// 0 !HISTORY 2003-09-07 [jriley] Subfiling, BFC
// 0 !HISTORY 2003-12-19 [PTadmin] Official Update 2003-03
// 0 !HISTORY 2007-08-29 [PTadmin] Header formatted for Contributor Agreement
// 0 !HISTORY 2008-07-01 [PTadmin] Official Update 2008-01
// 
// 
// 1 16 0 4 0 1 0 0 0 -5 0 0 0 1 stud3.dat
  [1,16,0,4,0,1,0,0,0,-5,0,0,0,1, ldraw_lib__stud3(realsolid)],
// 0 BFC INVERTNEXT
  [0,"BFC","INVERTNEXT"],
// 1 16 0 24 0 16 0 0 0 -20 0 0 0 6 box5.dat
  [1,16,0,24,0,16,0,0,0,-20,0,0,0,6, ldraw_lib__box5(realsolid)],
// 4 16 20 24 10 16 24 6 -16 24 6 -20 24 10
  [4,16,20,24,10,16,24,6,-16,24,6,-20,24,10],
// 4 16 -20 24 10 -16 24 6 -16 24 -6 -20 24 -10
  [4,16,-20,24,10,-16,24,6,-16,24,-6,-20,24,-10],
// 4 16 -20 24 -10 -16 24 -6 16 24 -6 20 24 -10
  [4,16,-20,24,-10,-16,24,-6,16,24,-6,20,24,-10],
// 4 16 20 24 -10 16 24 -6 16 24 6 20 24 10
  [4,16,20,24,-10,16,24,-6,16,24,6,20,24,10],
// 1 16 0 24 0 20 0 0 0 -24 0 0 0 10 box4t.dat
  [1,16,0,24,0,20,0,0,0,-24,0,0,0,10, ldraw_lib__box4t(realsolid)],
// 1 16 10 0 0 1 0 0 0 1 0 0 0 1 stud.dat
  [1,16,10,0,0,1,0,0,0,1,0,0,0,1, ldraw_lib__stud(realsolid)],
// 1 16 -10 0 0 1 0 0 0 1 0 0 0 1 stud.dat
  [1,16,-10,0,0,1,0,0,0,1,0,0,0,1, ldraw_lib__stud(realsolid)],
// 0
];
module ldraw_lib__s__3004s01(step=0, col=false, unit=2/5, alt=false, line=0.2, solid=!$preview)
    makepoly(ldraw_lib__s__3004s01(solid), step=step, col=col, unit=unit, alt=alt, line=line, solid=solid);
ldraw_lib__s__3004s01(line=0.2);
// file: ../p/1-4disc.scad
use <../lib.scad>
$fa=1; $fs=0.2;
function ldraw_lib__1_4disc(realsolid=false) = [
// 0 Disc 0.25
// 0 Name: 1-4disc.dat
// 0 Author: James Jessiman
// 0 !LDRAW_ORG Primitive UPDATE 2002-02
// 0 !LICENSE Licensed under CC BY 2.0 and CC BY 4.0 : see CAreadme.txt
// 
// 0 BFC CERTIFY CCW
  [0,"BFC","CERTIFY"],
  [0,"BFC","CCW"],
// 
// 0 !HISTORY 2002-03-23 [sbliss] Added BFC statement.
// 0 !HISTORY 2002-04-25 [PTadmin] Official Update 2002-02
// 0 !HISTORY 2007-06-22 [PTadmin] Header formatted for Contributor Agreement
// 0 !HISTORY 2008-07-01 [PTadmin] Official Update 2008-01
// 
// 
// 3 16 0 0 0 1 0 0 0.9239 0 0.3827
  [3,16,0,0,0,1,0,0,0.9239,0,0.3827],
// 3 16 0 0 0 0.9239 0 0.3827 0.7071 0 0.7071
  [3,16,0,0,0,0.9239,0,0.3827,0.7071,0,0.7071],
// 3 16 0 0 0 0.7071 0 0.7071 0.3827 0 0.9239
  [3,16,0,0,0,0.7071,0,0.7071,0.3827,0,0.9239],
// 3 16 0 0 0 0.3827 0 0.9239 0 0 1
  [3,16,0,0,0,0.3827,0,0.9239,0,0,1],
// 0
];
module ldraw_lib__1_4disc(step=0, col=false, unit=2/5, alt=false, line=0.2, solid=!$preview)
    makepoly(ldraw_lib__1_4disc(solid), step=step, col=col, unit=unit, alt=alt, line=line, solid=solid);
ldraw_lib__1_4disc(line=0.2);
// file: ../p/1-4cylc.scad
use <../lib.scad>
use <1-4cyli.scad>
use <1-4disc.scad>
use <1-4edge.scad>
$fa=1; $fs=0.2;
function ldraw_lib__1_4cylc(realsolid=false) = [
// 0 Cylinder Closed 0.25
// 0 Name: 1-4cylc.dat
// 0 Author: Mark Kennedy [mkennedy]
// 0 !LDRAW_ORG Primitive UPDATE 2010-01
// 0 !LICENSE Licensed under CC BY 2.0 and CC BY 4.0 : see CAreadme.txt
// 
// 0 BFC CERTIFY CCW
  [0,"BFC","CERTIFY"],
  [0,"BFC","CCW"],
// 
// 0 !HISTORY 2010-04-05 [PTadmin] Official Update 2010-01
// 
// 
// 1 16 0 0 0 1 0 0 0 1 0 0 0 1 1-4edge.dat
  [1,16,0,0,0,1,0,0,0,1,0,0,0,1, ldraw_lib__1_4edge(realsolid)],
// 1 16 0 1 0 1 0 0 0 1 0 0 0 1 1-4edge.dat
  [1,16,0,1,0,1,0,0,0,1,0,0,0,1, ldraw_lib__1_4edge(realsolid)],
// 1 16 0 0 0 1 0 0 0 1 0 0 0 1 1-4disc.dat
  [1,16,0,0,0,1,0,0,0,1,0,0,0,1, ldraw_lib__1_4disc(realsolid)],
// 1 16 0 0 0 1 0 0 0 1 0 0 0 1 1-4cyli.dat
  [1,16,0,0,0,1,0,0,0,1,0,0,0,1, ldraw_lib__1_4cyli(realsolid)],
// 0
];
module ldraw_lib__1_4cylc(step=0, col=false, unit=2/5, alt=false, line=0.2, solid=!$preview)
    makepoly(ldraw_lib__1_4cylc(solid), step=step, col=col, unit=unit, alt=alt, line=line, solid=solid);
ldraw_lib__1_4cylc(line=0.2);
// file: 3004.scad
use <../lib.scad>
use <s/3004s01.scad>
$fa=1; $fs=0.2;
function ldraw_lib__3004(realsolid=false) = [
// 0 Brick  1 x  2
// 0 Name: 3004.dat
// 0 Author: James Jessiman
// 0 !LDRAW_ORG Part UPDATE 2022-05
// 0 !LICENSE Licensed under CC BY 2.0 and CC BY 4.0 : see CAreadme.txt
// 
// 0 BFC CERTIFY CCW
  [0,"BFC","CERTIFY"],
  [0,"BFC","CCW"],
// 
// 0 !HISTORY 2001-10-26 [PTadmin] Official Update 2001-01
// 0 !HISTORY 2002-05-07 {unknown} BFC Certification
// 0 !HISTORY 2002-06-11 [PTadmin] Official Update 2002-03
// 0 !HISTORY 2007-05-07 [PTadmin] Header formatted for Contributor Agreement
// 0 !HISTORY 2008-07-01 [PTadmin] Official Update 2008-01
// 0 !HISTORY 2022-08-04 [MagFors] Using subfile
// 0 !HISTORY 2022-09-15 [PTadmin] Official Update 2022-05
// 
// 
// 1 16 0 0 0 1 0 0 0 1 0 0 0 1 s\3004s01.dat
  [1,16,0,0,0,1,0,0,0,1,0,0,0,1, ldraw_lib__s__3004s01(realsolid)],
// 4 16 -20 24 -10 20 24 -10 20 0 -10 -20 0 -10
  [4,16,-20,24,-10,20,24,-10,20,0,-10,-20,0,-10],
];
module ldraw_lib__3004(step=0, col=false, unit=2/5, alt=false, line=0.2, solid=!$preview)
    makepoly(ldraw_lib__3004(solid), step=step, col=col, unit=unit, alt=alt, line=line, solid=solid);
ldraw_lib__3004(line=0.2);
// file: 191765.scad
use <../lib.scad>
use <../p/1-4cylc.scad>
use <../p/1-4disc.scad>
$fa=1; $fs=0.2;
function ldraw_lib__191765(realsolid=false) = [
// 0 Cardboard  6 x  6 Thick with Rounded Corners with Silver Top
// 0 Name: 191765.dat
// 0 Author: Steffen [Steffen]
// 0 !LDRAW_ORG Part UPDATE 2020-02
// 0 !LICENSE Licensed under CC BY 2.0 and CC BY 4.0 : see CAreadme.txt
// 
// 0 !HELP For Plate 8 x 8 with Grille
// 
// 0 BFC CERTIFY CCW
  [0,"BFC","CERTIFY"],
  [0,"BFC","CCW"],
// 
// 0 !CATEGORY Sheet Cardboard
// 0 !KEYWORDS Scala, set 4336
// 
// 0 !HISTORY 2019-09-09 [PTadmin] Official Update 2019-02
// 0 !HISTORY 2020-07-06 [Steffen] adjusted title and !HELP
// 0 !HISTORY 2020-07-08 [PTadmin] Renamed from u9252p01
// 0 !HISTORY 2020-09-05 [PTadmin] Official Update 2020-02
// 
// 
// 1 383 -52 0 52 0 0 -8 0 1 0 8 0 0 1-4disc.dat
  [1,383,-52,0,52,0,0,-8,0,1,0,8,0,0, ldraw_lib__1_4disc(realsolid)],
// 1 383 52 0 52 8 0 0 0 1 0 0 0 8 1-4disc.dat
  [1,383,52,0,52,8,0,0,0,1,0,0,0,8, ldraw_lib__1_4disc(realsolid)],
// 1 383 52 0 -52 0 0 8 0 1 0 -8 0 0 1-4disc.dat
  [1,383,52,0,-52,0,0,8,0,1,0,-8,0,0, ldraw_lib__1_4disc(realsolid)],
// 1 383 -52 0 -52 -8 0 0 0 1 0 0 0 -8 1-4disc.dat
  [1,383,-52,0,-52,-8,0,0,0,1,0,0,0,-8, ldraw_lib__1_4disc(realsolid)],
// 4 383 -52 0 -52 52 0 -52 52 0 52 -52 0 52
  [4,383,-52,0,-52,52,0,-52,52,0,52,-52,0,52],
// 4 383 -52 0 52 52 0 52 52 0 60 -52 0 60
  [4,383,-52,0,52,52,0,52,52,0,60,-52,0,60],
// 4 383 -52 0 -60 52 0 -60 52 0 -52 -52 0 -52
  [4,383,-52,0,-60,52,0,-60,52,0,-52,-52,0,-52],
// 4 383 -52 0 -52 -52 0 52 -60 0 52 -60 0 -52
  [4,383,-52,0,-52,-52,0,52,-60,0,52,-60,0,-52],
// 4 383 60 0 -52 60 0 52 52 0 52 52 0 -52
  [4,383,60,0,-52,60,0,52,52,0,52,52,0,-52],
// 
// 4 16 -52 2 52 52 2 52 52 2 -52 -52 2 -52
  [4,16,-52,2,52,52,2,52,52,2,-52,-52,2,-52],
// 4 16 -52 2 -52 52 2 -52 52 2 -60 -52 2 -60
  [4,16,-52,2,-52,52,2,-52,52,2,-60,-52,2,-60],
// 4 16 -52 2 60 52 2 60 52 2 52 -52 2 52
  [4,16,-52,2,60,52,2,60,52,2,52,-52,2,52],
// 4 16 -52 2 52 -52 2 -52 -60 2 -52 -60 2 52
  [4,16,-52,2,52,-52,2,-52,-60,2,-52,-60,2,52],
// 4 16 60 2 52 60 2 -52 52 2 -52 52 2 52
  [4,16,60,2,52,60,2,-52,52,2,-52,52,2,52],
// 
// 1 16 -52 2 -52 0 0 -8 0 -2 0 -8 0 0 1-4cylc.dat
  [1,16,-52,2,-52,0,0,-8,0,-2,0,-8,0,0, ldraw_lib__1_4cylc(realsolid)],
// 1 16 -52 2 52 -8 0 0 0 -2 0 0 0 8 1-4cylc.dat
  [1,16,-52,2,52,-8,0,0,0,-2,0,0,0,8, ldraw_lib__1_4cylc(realsolid)],
// 1 16 52 2 52 0 0 8 0 -2 0 8 0 0 1-4cylc.dat
  [1,16,52,2,52,0,0,8,0,-2,0,8,0,0, ldraw_lib__1_4cylc(realsolid)],
// 1 16 52 2 -52 8 0 0 0 -2 0 0 0 -8 1-4cylc.dat
  [1,16,52,2,-52,8,0,0,0,-2,0,0,0,-8, ldraw_lib__1_4cylc(realsolid)],
// 
// 4 16 60 2 -52 60 2 52 60 0 52 60 0 -52
  [4,16,60,2,-52,60,2,52,60,0,52,60,0,-52],
// 4 16 52 2 60 -52 2 60 -52 0 60 52 0 60
  [4,16,52,2,60,-52,2,60,-52,0,60,52,0,60],
// 4 16 -60 2 52 -60 2 -52 -60 0 -52 -60 0 52
  [4,16,-60,2,52,-60,2,-52,-60,0,-52,-60,0,52],
// 4 16 -52 2 -60 52 2 -60 52 0 -60 -52 0 -60
  [4,16,-52,2,-60,52,2,-60,52,0,-60,-52,0,-60],
// 
// 2 24 -52 0 -60 52 0 -60
  [2,24,-52,0,-60,52,0,-60],
// 2 24 -52 2 -60 52 2 -60
  [2,24,-52,2,-60,52,2,-60],
// 2 24 60 0 -52 60 0 52
  [2,24,60,0,-52,60,0,52],
// 2 24 60 2 -52 60 2 52
  [2,24,60,2,-52,60,2,52],
// 2 24 52 0 60 -52 0 60
  [2,24,52,0,60,-52,0,60],
// 2 24 52 2 60 -52 2 60
  [2,24,52,2,60,-52,2,60],
// 2 24 -60 0 52 -60 0 -52
  [2,24,-60,0,52,-60,0,-52],
// 2 24 -60 2 52 -60 2 -52
  [2,24,-60,2,52,-60,2,-52],
];
module ldraw_lib__191765(step=0, col=false, unit=2/5, alt=false, line=0.2, solid=!$preview)
    makepoly(ldraw_lib__191765(solid), step=step, col=col, unit=unit, alt=alt, line=line, solid=solid);
ldraw_lib__191765(line=0.2);
// main file
use <../lib.scad>
use <191765.scad>
$fa=1; $fs=0.2;
function ldraw_lib__u9252p01(realsolid=false) = [
// 0 ~Moved to 191765
// 0 Name: u9252p01.dat
// 0 Author: [PTadmin]
// 0 !LDRAW_ORG Part UPDATE 2020-02
// 0 !LICENSE Licensed under CC BY 4.0 : see CAreadme.txt
// 
// 0 BFC CERTIFY CCW
  [0,"BFC","CERTIFY"],
  [0,"BFC","CCW"],
// 
// 0 !HISTORY 2020-09-05 [PTadmin] Official Update 2020-02
// 
// 
// 0 // Cardboard 6 x 6 Thick with Rounded Corners with Silver Top
// 1 16 0 0 0 1 0 0 0 1 0 0 0 1 191765.dat
  [1,16,0,0,0,1,0,0,0,1,0,0,0,1, ldraw_lib__191765(realsolid)],
];
module ldraw_lib__u9252p01(step=0, col=false, unit=2/5, alt=false, line=0.2, solid=!$preview)
    makepoly(ldraw_lib__u9252p01(solid), step=step, col=col, unit=unit, alt=alt, line=line, solid=solid);
ldraw_lib__u9252p01(line=0.2);
